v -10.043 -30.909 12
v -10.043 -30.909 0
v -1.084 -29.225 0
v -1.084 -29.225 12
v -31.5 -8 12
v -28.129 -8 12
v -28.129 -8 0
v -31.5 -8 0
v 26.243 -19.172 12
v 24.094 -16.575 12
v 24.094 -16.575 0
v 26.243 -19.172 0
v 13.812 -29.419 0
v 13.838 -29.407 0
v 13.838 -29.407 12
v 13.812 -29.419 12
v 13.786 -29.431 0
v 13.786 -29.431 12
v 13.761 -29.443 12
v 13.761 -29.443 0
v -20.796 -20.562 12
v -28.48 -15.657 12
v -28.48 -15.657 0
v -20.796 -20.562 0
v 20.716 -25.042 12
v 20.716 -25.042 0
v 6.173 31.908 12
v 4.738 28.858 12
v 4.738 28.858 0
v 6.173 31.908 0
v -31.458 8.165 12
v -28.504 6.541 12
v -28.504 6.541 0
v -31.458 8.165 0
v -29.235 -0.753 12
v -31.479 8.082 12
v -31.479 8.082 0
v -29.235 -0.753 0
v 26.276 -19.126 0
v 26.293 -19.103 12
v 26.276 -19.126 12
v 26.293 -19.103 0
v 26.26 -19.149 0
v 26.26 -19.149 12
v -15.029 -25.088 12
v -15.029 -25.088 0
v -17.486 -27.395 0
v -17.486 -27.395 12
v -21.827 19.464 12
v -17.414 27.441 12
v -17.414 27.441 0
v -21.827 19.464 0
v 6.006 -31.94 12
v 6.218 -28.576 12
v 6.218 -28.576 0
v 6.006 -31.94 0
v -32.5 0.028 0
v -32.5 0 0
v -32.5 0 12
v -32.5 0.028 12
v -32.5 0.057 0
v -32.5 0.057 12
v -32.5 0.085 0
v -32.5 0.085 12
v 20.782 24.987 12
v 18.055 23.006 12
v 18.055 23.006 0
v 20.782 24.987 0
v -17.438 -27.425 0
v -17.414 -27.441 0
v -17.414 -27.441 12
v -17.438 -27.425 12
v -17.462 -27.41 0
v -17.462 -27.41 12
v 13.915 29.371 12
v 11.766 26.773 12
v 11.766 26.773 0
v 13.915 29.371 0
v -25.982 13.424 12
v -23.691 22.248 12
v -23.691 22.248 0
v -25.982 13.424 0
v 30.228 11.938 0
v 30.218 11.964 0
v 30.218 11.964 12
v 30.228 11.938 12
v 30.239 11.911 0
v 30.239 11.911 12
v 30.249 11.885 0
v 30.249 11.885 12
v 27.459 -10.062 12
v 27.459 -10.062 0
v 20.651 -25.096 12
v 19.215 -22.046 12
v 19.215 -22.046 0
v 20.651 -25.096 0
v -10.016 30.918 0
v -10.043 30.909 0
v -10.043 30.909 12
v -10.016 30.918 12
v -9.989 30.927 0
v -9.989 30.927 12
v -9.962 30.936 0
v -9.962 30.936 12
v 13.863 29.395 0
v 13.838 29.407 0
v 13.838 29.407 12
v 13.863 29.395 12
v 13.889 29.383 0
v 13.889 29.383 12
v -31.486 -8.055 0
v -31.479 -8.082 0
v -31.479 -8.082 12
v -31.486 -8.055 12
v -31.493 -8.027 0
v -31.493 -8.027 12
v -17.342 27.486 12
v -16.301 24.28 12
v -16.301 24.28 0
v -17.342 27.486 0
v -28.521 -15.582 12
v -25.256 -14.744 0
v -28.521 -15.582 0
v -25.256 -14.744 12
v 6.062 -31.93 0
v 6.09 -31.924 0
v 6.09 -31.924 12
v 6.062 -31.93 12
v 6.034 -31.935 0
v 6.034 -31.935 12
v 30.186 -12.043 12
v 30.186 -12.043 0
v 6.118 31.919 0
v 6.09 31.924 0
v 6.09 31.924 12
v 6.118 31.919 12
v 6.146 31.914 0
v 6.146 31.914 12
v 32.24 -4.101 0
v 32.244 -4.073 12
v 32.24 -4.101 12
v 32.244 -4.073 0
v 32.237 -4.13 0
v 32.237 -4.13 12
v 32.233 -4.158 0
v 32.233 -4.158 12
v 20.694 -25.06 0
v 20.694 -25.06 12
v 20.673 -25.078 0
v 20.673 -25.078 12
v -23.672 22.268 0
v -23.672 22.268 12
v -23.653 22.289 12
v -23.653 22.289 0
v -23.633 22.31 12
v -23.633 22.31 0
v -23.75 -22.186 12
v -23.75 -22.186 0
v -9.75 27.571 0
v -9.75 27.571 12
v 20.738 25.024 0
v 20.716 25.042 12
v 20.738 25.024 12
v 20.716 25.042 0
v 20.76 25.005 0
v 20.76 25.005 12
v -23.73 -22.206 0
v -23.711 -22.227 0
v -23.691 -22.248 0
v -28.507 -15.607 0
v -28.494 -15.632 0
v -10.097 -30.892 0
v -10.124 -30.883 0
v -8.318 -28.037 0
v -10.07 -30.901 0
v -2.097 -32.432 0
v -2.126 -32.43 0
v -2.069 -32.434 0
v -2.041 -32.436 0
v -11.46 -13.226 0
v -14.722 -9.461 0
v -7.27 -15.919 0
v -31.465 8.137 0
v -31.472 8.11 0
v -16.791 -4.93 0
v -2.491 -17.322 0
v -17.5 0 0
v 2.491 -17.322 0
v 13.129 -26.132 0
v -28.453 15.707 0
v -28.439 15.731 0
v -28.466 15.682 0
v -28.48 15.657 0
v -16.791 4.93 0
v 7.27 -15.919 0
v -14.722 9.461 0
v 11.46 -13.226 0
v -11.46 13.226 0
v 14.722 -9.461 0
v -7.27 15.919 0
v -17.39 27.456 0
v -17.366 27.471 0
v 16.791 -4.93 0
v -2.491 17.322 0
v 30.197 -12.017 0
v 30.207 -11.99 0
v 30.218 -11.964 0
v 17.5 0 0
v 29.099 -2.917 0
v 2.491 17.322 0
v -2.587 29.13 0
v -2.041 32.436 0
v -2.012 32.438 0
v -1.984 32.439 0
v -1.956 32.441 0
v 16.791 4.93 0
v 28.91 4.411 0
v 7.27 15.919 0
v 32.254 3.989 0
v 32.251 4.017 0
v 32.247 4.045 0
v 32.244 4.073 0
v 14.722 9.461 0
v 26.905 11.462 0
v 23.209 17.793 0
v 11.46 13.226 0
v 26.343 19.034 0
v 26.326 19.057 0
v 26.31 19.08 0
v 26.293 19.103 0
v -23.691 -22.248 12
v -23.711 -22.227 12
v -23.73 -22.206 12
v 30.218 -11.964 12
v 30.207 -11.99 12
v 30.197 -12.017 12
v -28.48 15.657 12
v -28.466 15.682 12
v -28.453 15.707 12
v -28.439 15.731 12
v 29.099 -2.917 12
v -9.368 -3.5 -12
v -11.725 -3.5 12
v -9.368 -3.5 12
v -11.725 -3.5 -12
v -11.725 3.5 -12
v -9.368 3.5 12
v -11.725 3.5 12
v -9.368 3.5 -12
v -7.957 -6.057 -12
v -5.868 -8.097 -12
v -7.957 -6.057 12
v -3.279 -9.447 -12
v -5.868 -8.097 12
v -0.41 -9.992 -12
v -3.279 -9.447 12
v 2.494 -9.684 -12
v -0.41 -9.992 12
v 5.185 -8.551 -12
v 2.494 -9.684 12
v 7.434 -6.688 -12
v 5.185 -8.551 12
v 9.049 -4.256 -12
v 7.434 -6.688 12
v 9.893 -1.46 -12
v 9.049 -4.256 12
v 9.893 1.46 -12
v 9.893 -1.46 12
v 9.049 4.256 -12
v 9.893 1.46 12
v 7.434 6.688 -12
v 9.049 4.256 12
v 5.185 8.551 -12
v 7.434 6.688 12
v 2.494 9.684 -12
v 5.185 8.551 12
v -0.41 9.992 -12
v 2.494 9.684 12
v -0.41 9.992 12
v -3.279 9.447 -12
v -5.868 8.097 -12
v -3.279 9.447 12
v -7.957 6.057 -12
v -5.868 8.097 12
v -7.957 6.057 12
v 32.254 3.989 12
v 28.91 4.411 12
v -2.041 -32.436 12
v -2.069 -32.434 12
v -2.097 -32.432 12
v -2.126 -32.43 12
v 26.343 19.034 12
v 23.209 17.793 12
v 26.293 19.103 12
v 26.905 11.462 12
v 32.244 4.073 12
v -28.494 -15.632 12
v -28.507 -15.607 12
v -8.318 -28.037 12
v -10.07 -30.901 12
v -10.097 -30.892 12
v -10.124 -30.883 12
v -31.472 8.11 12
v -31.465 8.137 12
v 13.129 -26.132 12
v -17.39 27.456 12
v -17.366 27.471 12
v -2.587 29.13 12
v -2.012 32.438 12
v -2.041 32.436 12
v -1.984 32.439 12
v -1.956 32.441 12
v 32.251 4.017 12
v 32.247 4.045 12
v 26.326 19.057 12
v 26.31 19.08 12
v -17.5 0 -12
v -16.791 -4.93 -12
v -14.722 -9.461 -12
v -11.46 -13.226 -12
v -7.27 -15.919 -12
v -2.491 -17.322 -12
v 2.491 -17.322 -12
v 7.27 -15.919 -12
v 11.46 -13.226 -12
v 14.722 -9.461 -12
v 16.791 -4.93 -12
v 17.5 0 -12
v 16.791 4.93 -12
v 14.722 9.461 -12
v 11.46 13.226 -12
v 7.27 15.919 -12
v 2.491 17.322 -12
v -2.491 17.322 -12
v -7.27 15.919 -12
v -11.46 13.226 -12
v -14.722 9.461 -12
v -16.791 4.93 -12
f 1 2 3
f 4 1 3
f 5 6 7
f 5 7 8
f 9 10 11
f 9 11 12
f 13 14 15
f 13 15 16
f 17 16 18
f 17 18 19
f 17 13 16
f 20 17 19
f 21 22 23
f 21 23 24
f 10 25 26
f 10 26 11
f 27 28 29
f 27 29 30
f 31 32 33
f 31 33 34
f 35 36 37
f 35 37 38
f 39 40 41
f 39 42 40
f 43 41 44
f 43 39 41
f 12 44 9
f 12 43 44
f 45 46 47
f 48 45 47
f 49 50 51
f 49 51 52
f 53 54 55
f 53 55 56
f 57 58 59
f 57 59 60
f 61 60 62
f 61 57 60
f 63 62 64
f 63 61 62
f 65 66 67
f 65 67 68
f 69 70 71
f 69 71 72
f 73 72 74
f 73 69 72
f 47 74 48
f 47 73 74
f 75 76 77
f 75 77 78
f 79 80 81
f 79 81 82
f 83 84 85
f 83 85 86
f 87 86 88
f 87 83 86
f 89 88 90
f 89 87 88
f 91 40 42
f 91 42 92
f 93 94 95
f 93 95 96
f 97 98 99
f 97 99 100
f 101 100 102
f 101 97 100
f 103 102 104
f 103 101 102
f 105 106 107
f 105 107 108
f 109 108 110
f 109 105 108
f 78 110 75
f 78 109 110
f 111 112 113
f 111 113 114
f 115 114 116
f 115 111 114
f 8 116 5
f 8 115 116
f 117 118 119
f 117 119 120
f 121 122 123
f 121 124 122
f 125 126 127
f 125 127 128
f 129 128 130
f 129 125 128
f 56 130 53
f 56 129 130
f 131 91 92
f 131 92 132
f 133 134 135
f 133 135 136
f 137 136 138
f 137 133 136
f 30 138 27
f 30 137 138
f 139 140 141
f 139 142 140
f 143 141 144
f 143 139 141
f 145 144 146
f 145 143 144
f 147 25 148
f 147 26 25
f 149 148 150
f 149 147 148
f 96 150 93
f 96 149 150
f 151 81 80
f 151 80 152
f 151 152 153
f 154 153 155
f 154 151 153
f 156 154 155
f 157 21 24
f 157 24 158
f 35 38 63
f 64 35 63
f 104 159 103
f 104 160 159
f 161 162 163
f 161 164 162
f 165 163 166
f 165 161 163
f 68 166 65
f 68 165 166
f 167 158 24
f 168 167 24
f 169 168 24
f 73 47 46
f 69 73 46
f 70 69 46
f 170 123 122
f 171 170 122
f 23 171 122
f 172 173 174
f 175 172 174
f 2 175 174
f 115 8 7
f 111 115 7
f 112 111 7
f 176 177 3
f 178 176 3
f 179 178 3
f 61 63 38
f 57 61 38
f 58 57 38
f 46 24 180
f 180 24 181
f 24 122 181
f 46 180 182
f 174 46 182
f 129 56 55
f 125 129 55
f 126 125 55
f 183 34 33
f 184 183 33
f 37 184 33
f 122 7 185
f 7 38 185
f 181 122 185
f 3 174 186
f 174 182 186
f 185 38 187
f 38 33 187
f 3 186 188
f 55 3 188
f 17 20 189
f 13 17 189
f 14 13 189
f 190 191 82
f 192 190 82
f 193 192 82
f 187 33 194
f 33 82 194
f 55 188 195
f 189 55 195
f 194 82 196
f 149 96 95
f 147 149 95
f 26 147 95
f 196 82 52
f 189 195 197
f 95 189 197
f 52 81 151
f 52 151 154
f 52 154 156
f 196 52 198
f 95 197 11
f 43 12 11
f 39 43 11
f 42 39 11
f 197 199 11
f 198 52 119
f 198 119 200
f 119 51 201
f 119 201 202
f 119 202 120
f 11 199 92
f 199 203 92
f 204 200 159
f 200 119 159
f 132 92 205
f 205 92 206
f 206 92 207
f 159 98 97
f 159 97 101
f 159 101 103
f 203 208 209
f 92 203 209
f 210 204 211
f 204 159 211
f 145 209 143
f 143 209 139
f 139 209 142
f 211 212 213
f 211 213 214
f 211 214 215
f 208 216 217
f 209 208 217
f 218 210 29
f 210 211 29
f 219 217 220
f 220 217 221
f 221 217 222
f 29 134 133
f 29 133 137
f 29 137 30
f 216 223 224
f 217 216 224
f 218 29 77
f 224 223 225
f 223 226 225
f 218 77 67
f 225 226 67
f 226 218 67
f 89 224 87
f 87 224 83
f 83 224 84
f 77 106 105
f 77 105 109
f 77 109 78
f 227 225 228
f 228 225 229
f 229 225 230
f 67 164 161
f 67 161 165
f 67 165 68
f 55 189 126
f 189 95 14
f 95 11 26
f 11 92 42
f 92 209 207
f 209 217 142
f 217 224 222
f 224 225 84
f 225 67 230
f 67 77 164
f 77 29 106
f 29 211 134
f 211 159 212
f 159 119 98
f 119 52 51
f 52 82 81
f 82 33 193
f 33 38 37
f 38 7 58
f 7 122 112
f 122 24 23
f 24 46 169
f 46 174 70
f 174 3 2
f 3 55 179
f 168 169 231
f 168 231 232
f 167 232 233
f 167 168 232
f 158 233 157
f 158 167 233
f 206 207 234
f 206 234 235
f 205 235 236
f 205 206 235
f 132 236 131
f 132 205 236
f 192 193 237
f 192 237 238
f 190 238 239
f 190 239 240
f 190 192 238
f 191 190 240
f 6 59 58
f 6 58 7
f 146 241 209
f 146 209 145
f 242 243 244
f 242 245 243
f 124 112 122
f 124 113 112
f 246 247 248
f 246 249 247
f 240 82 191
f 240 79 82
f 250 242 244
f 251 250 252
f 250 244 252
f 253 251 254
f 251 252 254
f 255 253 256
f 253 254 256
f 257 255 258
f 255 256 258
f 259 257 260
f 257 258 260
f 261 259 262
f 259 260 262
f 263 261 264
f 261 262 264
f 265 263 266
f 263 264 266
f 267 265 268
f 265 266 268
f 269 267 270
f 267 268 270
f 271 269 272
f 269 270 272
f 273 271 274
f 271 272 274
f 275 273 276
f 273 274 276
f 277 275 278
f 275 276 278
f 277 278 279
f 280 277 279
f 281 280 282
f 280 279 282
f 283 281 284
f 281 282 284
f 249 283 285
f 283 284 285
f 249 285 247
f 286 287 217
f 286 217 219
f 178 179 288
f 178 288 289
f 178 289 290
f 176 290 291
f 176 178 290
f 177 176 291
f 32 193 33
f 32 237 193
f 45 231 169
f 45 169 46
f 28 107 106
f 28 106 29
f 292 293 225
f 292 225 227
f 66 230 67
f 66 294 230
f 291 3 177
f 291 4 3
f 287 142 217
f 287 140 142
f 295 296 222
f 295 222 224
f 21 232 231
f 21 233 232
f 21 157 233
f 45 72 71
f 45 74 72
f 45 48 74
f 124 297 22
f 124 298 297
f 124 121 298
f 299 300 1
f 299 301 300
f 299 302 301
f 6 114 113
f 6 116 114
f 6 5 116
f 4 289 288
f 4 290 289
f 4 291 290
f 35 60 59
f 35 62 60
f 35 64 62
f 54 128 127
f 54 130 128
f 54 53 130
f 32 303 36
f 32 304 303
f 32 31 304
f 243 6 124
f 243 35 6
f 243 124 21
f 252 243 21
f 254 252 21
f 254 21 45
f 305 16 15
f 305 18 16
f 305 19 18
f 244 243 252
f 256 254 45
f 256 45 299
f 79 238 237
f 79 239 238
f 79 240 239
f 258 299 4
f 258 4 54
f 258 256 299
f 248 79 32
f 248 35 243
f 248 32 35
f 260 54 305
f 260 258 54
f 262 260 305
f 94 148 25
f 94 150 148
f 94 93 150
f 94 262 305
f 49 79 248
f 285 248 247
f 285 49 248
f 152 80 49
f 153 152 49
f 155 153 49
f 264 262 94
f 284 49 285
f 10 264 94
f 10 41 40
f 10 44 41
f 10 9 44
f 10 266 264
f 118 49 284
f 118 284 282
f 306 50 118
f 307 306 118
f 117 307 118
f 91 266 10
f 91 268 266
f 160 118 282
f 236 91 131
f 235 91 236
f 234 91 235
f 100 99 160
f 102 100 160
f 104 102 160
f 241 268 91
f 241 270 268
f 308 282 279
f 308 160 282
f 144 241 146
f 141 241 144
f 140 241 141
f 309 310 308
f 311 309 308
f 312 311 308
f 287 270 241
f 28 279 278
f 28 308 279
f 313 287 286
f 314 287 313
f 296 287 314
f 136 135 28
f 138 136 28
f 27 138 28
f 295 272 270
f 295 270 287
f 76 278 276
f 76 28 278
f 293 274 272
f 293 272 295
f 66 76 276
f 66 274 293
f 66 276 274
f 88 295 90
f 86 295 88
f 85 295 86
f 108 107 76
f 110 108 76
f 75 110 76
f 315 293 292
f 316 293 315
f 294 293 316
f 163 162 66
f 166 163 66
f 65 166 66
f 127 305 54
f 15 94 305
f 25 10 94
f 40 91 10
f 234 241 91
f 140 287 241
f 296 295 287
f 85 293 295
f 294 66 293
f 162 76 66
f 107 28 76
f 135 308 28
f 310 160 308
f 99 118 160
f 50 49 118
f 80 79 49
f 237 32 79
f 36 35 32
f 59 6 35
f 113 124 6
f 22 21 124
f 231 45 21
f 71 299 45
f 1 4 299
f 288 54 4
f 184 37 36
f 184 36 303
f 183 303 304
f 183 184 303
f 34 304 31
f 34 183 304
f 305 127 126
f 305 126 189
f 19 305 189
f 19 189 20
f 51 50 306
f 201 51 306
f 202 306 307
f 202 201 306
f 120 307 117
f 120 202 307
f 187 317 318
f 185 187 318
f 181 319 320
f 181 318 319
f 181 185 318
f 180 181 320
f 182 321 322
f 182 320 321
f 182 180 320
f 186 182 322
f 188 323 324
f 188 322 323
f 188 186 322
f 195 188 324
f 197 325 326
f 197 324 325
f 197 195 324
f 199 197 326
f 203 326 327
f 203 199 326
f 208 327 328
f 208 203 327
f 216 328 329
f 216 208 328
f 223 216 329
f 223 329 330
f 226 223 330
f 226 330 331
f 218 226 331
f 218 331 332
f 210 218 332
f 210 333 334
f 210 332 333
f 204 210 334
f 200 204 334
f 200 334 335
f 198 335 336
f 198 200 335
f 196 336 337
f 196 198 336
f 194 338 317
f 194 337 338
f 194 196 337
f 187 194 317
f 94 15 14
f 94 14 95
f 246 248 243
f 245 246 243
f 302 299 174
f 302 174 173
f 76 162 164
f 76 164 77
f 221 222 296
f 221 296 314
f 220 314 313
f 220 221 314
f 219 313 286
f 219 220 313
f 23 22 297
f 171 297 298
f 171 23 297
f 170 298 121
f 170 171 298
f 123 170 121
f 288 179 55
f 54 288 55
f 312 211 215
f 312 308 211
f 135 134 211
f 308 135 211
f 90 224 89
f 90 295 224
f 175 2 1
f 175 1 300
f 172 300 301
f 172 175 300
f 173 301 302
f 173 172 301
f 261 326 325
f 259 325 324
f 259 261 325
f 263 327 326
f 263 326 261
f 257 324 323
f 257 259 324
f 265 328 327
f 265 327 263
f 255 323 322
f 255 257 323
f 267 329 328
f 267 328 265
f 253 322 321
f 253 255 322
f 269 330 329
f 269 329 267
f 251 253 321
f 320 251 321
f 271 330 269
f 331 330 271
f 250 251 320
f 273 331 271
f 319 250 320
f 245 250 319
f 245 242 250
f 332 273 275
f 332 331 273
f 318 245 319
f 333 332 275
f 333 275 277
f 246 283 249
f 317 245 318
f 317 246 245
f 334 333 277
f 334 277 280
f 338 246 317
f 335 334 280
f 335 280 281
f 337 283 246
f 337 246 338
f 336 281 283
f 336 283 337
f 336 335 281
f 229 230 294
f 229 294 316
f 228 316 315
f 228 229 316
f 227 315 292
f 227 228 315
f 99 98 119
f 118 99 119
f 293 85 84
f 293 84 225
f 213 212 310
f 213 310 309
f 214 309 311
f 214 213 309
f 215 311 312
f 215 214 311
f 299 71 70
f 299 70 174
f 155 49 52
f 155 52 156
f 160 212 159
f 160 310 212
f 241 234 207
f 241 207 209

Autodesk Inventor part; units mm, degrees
ref_plane "YZ Plane" through (0, 0, 0) normal (1, 0, 0) x (0, 1, 0)
ref_plane "XZ Plane" through (0, 0, 0) normal (0, 1, 0) x (-1, 0, 0)
ref_plane "XY Plane" through (0, 0, 0) normal (0, 0, 1) x (1, 0, 0)
sketch "Boceto1" plane through (0, 0, 0) normal (0, 0, 1) x (1, 0, 0)
  circle A0 centre (0, 0) radius 32.5
  circle A1 centre (0, 0) radius 10
  line L0 (0, -32.5) -> (0, 0) construction
  line L1 (0, -32.5) -> (-9.058, -23.9422)
  line L2 (-9.058, -23.9422) -> (-10.8513, -30.6349)
  dimension "d0" = 65
  dimension "d1" = 20
  dimension "d4" = 15
extrude "Extrusión1" add sketch "Boceto1" along normal blind 12
sketch "Boceto2" plane through (0, 0, 12) normal (0, 0, 1) x (1, 0, 0)
  line L0 (-32.5, 0) -> (0, 0) construction
  line L1 (-32.5, 0) -> (-28.1293, -8)
  line L2 (-28.1293, -8) -> (-31.5, -8)
  circle A0 centre (0, 0) radius 29.2448 construction
  arc A1 (-32.5, 0) -> (-31.5, -8) centre (0, 0) ccw construction
  arc A2 (-32.5, 0) -> (-31.5, -8) centre (0, 0) ccw construction
  circle A3 centre (0, 0) radius 10 projected
  arc A4 (-32.5, 0) -> (-31.5, -8) centre (0, 0) ccw
  dimension "d5" = 8
  dimension "d7" = 8
  dimension "d22" = 20
extrude "Extrusión2" cut sketch "Boceto2" against normal blind 12 contours L1 L2 A4
pattern_circular "Patrón circular1" count 25 over 360 about axis through (0, 0, -10) along (0, 0, 1) of "Extrusión2"
sketch "Boceto3" plane through (0, 0, 0) normal (0, 0, -1) x (-1, 0, 0)
  circle A0 centre (0, 0) radius 17.5
  circle A1 centre (0, 0) radius 10
  dimension "d13" = 35
  dimension "d23" = 20
extrude "Extrusión3" add sketch "Boceto3" along normal blind 12
sketch "Boceto5" plane through (0, 0, -12) normal (0, 0, -1) x (-1, 0, 0)
  circle A0 centre (0, 0) radius 10 projected
  line L0 (11.725, -3.5) -> (8.275, 3.5) construction
  line L1 (8.275, -3.5) -> (11.725, 3.5) construction
  line L2 (9.3675, 3.5) -> (11.725, 3.5)
  line L3 (11.725, -3.5) -> (9.3675, -3.5)
  arc A1 (9.3675, 3.5) -> (9.3675, -3.5) centre (0, 0) ccw
  line L4 (11.725, 3.5) -> (11.725, -3.5)
  dimension "d24" = 3.45
  dimension "d25" = 7
extrude "Extrusión4" cut sketch "Boceto5" against normal blind 24 contours A0 L2 L4 L3
properties part number "Pieza Propia Ensamblaje - Alison"
